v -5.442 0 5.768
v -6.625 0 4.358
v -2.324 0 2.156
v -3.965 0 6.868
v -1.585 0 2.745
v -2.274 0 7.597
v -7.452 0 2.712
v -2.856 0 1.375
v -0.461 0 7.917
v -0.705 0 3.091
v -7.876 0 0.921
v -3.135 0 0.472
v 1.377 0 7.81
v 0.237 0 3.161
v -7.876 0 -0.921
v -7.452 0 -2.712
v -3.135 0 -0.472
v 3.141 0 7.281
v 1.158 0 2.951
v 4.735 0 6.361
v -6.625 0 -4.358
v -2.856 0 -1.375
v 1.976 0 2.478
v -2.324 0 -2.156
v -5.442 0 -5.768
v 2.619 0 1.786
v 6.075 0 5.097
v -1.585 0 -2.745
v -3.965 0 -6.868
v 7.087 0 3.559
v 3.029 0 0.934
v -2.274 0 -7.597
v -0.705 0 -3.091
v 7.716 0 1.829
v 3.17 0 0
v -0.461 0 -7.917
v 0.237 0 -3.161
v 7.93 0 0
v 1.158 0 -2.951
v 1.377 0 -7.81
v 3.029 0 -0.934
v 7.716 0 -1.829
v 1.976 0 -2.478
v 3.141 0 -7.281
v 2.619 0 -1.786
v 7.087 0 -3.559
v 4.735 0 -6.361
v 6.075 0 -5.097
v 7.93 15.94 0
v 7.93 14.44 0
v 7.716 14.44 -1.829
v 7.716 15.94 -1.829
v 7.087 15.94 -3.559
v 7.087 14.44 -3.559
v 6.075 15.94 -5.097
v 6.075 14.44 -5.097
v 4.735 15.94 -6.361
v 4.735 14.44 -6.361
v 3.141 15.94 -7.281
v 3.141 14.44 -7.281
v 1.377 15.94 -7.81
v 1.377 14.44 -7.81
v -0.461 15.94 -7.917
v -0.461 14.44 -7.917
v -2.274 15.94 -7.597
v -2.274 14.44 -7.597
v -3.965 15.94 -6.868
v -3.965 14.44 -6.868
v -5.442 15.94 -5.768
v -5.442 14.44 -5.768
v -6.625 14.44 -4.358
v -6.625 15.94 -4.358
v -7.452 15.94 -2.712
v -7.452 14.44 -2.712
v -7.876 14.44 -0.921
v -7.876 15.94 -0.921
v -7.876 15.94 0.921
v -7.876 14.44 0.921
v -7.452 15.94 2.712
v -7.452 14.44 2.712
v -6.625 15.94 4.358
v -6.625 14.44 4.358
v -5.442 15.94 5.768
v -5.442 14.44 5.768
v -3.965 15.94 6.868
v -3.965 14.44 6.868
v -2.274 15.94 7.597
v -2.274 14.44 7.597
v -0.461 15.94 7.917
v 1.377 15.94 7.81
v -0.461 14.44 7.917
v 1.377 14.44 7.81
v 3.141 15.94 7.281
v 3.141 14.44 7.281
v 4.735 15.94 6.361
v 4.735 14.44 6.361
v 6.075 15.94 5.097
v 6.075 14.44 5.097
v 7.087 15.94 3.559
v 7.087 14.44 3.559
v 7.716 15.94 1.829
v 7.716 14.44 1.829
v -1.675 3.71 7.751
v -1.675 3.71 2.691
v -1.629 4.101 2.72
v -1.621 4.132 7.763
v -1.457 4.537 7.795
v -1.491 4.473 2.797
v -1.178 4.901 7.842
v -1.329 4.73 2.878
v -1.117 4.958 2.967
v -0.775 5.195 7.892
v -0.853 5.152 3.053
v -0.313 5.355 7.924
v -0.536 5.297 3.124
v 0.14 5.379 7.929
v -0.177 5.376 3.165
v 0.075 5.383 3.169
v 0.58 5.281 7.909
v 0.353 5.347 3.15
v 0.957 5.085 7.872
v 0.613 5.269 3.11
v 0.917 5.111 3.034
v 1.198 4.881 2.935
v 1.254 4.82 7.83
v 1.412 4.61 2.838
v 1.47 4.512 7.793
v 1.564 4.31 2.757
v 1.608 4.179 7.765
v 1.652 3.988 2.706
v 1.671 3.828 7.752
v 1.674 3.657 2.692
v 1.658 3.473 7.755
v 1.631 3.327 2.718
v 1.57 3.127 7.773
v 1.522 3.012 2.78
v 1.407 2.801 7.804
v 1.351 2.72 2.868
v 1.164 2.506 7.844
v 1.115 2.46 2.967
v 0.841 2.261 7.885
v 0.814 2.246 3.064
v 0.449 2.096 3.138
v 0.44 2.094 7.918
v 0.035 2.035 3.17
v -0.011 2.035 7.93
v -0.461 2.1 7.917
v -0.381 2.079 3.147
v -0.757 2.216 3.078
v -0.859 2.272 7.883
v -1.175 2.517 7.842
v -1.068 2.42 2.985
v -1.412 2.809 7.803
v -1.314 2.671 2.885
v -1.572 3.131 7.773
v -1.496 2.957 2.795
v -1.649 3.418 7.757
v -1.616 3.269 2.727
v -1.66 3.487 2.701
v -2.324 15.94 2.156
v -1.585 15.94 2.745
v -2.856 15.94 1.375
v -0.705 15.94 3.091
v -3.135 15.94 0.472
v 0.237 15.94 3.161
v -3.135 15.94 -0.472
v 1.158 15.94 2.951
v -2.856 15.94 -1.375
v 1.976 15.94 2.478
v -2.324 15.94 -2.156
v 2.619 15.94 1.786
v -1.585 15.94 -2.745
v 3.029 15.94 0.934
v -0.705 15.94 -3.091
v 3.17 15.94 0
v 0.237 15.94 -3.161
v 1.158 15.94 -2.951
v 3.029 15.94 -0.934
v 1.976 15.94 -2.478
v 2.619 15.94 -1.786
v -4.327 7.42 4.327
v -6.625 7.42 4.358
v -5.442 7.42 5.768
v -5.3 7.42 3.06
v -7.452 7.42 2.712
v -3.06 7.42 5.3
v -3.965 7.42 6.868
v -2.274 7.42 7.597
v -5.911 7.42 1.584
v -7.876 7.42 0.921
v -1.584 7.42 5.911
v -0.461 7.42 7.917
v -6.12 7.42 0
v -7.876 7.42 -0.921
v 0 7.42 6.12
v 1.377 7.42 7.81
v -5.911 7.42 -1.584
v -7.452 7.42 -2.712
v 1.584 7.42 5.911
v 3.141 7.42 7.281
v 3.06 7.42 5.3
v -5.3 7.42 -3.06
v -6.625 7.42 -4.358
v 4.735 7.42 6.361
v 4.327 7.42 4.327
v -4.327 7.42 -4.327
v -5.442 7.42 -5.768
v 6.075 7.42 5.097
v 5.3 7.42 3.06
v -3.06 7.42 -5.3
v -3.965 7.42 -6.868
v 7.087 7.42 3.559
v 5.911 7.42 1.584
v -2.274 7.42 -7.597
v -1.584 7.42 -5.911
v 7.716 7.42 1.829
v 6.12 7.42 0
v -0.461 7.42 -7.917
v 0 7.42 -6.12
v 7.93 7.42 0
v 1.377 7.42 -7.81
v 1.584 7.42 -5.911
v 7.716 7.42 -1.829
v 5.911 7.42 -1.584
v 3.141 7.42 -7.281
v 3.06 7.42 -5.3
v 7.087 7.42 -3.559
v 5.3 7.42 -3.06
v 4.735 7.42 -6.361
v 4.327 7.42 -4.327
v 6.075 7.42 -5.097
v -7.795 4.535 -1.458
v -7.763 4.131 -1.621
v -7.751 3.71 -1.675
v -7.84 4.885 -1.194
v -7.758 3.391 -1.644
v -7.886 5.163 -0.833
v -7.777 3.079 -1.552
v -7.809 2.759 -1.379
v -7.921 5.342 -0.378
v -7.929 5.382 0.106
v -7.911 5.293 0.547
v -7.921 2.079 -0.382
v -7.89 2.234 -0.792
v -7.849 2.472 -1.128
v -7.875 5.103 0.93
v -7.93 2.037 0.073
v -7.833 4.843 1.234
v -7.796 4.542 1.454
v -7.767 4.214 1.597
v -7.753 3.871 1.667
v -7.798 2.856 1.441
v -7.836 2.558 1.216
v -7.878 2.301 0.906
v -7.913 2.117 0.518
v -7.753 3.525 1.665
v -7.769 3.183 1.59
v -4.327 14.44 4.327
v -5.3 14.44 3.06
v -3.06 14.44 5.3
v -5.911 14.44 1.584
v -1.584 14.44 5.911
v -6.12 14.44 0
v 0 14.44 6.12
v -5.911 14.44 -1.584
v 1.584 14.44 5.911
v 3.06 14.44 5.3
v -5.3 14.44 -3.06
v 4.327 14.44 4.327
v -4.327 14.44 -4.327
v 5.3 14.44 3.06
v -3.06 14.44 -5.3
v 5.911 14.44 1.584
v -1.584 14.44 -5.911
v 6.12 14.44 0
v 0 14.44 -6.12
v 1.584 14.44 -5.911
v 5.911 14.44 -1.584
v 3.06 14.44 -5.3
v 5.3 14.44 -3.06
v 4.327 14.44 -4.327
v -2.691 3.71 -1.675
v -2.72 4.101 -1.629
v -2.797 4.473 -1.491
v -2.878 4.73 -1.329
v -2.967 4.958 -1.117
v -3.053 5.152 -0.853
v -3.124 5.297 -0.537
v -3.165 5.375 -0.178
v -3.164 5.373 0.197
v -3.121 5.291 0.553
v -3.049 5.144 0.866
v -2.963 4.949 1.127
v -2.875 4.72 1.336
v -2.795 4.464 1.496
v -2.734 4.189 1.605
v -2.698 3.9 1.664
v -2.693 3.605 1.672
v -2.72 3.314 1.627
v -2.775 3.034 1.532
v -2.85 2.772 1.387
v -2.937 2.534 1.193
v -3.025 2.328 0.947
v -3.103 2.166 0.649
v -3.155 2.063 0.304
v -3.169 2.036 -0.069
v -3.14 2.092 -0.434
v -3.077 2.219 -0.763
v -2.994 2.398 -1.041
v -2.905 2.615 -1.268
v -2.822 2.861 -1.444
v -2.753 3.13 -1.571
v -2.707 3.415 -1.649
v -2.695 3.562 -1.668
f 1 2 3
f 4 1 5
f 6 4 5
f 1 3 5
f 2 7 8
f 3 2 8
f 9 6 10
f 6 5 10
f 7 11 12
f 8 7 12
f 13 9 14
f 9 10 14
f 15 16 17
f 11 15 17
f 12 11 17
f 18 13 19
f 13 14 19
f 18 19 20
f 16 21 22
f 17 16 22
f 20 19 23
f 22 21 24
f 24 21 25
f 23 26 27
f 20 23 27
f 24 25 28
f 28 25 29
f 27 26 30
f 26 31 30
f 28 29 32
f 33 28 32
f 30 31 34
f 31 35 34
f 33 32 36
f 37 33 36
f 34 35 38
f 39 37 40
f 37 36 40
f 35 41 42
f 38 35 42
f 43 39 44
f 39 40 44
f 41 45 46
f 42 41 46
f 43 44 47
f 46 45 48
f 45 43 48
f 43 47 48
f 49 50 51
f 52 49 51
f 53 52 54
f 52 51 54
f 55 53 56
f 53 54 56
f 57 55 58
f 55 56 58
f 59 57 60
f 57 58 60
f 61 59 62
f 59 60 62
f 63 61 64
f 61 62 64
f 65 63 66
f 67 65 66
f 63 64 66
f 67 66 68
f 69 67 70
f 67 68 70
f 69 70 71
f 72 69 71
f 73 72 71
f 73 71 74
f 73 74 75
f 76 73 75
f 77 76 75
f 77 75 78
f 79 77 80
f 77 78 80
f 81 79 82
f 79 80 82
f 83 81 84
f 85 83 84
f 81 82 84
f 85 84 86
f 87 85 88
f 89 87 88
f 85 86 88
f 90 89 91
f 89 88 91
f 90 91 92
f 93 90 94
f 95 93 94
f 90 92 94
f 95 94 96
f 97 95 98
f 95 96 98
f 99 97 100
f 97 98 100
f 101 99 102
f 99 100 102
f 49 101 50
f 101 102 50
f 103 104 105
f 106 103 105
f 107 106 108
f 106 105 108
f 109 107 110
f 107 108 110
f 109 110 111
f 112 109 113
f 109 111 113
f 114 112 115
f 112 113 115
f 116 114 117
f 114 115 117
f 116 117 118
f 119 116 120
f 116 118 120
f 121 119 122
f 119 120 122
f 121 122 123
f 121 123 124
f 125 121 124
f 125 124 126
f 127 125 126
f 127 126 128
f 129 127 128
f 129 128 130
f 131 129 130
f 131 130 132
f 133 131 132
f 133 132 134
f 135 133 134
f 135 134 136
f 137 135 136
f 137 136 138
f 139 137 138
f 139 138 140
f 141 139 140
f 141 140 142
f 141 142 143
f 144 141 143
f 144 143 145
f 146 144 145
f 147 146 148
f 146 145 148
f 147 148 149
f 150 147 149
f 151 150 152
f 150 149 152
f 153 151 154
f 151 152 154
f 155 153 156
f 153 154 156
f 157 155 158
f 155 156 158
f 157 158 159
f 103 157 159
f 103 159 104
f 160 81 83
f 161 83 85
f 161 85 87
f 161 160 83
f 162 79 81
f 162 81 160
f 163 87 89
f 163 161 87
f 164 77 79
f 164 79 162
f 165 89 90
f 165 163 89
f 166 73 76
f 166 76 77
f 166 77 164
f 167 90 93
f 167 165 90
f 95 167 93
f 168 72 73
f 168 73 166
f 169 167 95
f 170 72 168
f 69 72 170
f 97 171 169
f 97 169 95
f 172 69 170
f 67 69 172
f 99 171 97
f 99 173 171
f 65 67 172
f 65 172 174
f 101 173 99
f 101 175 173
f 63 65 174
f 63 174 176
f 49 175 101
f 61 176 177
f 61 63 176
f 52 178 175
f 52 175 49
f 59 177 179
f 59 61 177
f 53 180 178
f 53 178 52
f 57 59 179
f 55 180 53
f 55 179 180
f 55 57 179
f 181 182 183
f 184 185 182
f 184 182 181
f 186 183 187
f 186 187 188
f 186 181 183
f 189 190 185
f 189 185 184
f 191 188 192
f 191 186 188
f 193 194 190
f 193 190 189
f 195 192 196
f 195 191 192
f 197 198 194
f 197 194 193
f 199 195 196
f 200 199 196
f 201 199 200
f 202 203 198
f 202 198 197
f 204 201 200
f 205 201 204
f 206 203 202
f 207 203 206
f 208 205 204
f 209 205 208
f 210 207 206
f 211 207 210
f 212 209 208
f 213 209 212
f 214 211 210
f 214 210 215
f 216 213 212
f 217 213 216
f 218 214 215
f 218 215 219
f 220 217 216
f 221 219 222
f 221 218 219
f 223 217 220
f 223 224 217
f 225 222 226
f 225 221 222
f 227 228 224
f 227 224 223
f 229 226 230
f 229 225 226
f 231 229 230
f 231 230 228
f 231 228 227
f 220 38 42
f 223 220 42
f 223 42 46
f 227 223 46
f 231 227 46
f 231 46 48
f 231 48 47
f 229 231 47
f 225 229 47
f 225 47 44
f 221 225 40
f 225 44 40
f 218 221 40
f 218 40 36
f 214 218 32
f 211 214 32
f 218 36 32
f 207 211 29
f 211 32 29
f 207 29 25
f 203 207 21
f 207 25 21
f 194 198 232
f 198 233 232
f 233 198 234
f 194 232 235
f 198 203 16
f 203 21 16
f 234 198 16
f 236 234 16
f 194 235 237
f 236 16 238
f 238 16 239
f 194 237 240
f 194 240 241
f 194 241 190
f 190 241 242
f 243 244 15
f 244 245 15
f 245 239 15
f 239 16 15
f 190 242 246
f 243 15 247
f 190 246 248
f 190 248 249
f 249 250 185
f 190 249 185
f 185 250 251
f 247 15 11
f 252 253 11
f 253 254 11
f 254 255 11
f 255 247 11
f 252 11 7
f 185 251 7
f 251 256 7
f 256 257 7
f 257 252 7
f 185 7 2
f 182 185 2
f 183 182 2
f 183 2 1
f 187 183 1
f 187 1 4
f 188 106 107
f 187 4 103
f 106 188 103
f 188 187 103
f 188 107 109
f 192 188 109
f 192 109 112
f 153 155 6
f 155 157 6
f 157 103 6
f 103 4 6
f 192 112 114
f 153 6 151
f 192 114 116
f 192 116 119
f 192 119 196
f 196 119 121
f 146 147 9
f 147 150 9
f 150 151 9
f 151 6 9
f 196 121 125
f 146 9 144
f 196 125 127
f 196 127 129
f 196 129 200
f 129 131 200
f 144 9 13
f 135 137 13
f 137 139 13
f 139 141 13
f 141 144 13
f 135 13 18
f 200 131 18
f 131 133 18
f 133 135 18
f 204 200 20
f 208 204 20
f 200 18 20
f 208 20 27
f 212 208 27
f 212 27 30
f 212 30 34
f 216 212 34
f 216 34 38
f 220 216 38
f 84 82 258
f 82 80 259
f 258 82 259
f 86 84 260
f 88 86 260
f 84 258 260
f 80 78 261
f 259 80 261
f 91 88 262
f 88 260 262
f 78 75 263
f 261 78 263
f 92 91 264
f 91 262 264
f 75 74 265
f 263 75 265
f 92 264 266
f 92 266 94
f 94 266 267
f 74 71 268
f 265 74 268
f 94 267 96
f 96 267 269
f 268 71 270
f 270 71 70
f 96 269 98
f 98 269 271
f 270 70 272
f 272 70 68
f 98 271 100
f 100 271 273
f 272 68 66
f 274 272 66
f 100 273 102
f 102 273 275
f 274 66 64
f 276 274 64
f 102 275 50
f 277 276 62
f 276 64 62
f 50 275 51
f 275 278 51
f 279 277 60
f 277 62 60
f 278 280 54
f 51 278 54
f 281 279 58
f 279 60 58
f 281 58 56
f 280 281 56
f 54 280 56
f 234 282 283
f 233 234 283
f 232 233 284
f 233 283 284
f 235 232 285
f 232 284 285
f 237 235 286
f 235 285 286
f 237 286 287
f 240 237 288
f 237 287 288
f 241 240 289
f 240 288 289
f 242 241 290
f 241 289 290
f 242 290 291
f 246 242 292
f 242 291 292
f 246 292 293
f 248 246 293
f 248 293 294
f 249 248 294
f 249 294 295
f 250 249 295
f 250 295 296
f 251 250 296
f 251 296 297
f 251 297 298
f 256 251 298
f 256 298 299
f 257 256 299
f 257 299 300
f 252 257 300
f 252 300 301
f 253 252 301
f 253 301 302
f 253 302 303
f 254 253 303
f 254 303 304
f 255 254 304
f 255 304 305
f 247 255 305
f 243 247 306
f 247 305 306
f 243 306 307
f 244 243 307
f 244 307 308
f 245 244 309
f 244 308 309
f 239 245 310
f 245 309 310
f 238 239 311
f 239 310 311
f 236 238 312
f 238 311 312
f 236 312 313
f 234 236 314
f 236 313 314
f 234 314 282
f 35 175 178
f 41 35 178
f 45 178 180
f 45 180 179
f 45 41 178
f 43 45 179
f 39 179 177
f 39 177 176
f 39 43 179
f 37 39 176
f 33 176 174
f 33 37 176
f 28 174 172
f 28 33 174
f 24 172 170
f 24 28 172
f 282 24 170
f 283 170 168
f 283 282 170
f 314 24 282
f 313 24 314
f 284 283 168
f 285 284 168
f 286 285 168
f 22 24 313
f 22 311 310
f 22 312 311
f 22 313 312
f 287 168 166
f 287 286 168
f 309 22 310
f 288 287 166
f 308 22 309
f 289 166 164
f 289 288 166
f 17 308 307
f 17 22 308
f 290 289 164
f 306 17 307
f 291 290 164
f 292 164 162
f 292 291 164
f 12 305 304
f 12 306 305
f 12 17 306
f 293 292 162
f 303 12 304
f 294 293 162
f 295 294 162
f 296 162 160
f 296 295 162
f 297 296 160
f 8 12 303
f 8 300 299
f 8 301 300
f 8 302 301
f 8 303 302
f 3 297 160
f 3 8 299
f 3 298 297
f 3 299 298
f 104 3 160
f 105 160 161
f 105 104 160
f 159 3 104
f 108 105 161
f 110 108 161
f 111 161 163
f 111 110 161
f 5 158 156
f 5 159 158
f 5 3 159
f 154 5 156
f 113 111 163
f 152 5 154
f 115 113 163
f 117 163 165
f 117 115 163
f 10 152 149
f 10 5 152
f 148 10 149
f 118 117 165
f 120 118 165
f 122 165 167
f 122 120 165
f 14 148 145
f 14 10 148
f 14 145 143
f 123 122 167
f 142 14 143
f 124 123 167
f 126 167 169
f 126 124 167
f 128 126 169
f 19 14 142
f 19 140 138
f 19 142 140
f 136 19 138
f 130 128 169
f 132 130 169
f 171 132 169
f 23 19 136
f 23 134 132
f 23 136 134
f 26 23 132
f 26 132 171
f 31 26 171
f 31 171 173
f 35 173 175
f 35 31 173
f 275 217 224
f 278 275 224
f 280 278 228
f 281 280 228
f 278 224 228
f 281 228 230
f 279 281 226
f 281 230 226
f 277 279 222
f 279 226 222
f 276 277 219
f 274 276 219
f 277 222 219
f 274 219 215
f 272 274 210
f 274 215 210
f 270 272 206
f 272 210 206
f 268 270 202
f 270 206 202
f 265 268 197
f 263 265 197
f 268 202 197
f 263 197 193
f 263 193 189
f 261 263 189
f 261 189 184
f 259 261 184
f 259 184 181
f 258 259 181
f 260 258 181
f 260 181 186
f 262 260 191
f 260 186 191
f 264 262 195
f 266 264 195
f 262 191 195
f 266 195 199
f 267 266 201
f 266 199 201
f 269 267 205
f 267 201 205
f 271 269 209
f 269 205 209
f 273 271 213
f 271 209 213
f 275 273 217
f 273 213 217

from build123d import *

# Parameters (mm, degrees)
SKETCH1_R           = 7.93
SKETCH1_R_2         = 3.17
BOSS_EXTRUDE1_DEPTH = 7.42
SKETCH2_R           = 6.12
SKETCH2_R_2         = 3.17
BOSS_EXTRUDE2_DEPTH = 7.02
SKETCH3_R           = 7.93
SKETCH3_R_2         = 3.17
BOSS_EXTRUDE3_DEPTH = 1.5
SKETCH4_R           = 1.675
CUT_EXTRUDE1_DEPTH  = 8.93
CIRPATTERN1_COUNT   = 2
CIRPATTERN1_ANGLE   = 90


with BuildPart() as part:
    # Sketch1 → Boss-Extrude1 (new body)
    with BuildSketch(Plane(origin=(0, 0, 0), x_dir=(1, 0, 0), z_dir=(0, 1, 0))):
        Circle(SKETCH1_R)
        Circle(SKETCH1_R_2, mode=Mode.SUBTRACT)
    extrude(amount=BOSS_EXTRUDE1_DEPTH)

    # Sketch2 → Boss-Extrude2 (add)
    with BuildSketch(Plane(origin=(0, 7.42, 0), x_dir=(1, 0, 0), z_dir=(0, 1, 0))):
        Circle(SKETCH2_R)
        Circle(SKETCH2_R_2, mode=Mode.SUBTRACT)
    extrude(amount=BOSS_EXTRUDE2_DEPTH)

    # Sketch3 → Boss-Extrude3 (add)
    with BuildSketch(Plane(origin=(0, 14.44, 0), x_dir=(1, 0, 0), z_dir=(0, 1, 0))):
        Circle(SKETCH3_R)
        Circle(SKETCH3_R_2, mode=Mode.SUBTRACT)
    extrude(amount=BOSS_EXTRUDE3_DEPTH)

    # Sketch4 → Cut-Extrude1 (cut, through all)
    with BuildSketch(Plane(origin=(0, 0, 0), x_dir=(0, 0, -1), z_dir=(1, 0, 0))):
        with Locations((0, 3.71)):
            Circle(SKETCH4_R)
    cut_extrude1 = extrude(amount=-CUT_EXTRUDE1_DEPTH, mode=Mode.SUBTRACT)

    # CirPattern1: Cut-Extrude1 ×2 about axis
    cirpattern1_axis = Axis((0, 7.42, 0), (0, 1, 0))
    for i in range(1, CIRPATTERN1_COUNT):
        add(cut_extrude1.rotate(cirpattern1_axis, i * CIRPATTERN1_ANGLE / (CIRPATTERN1_COUNT - 1)), mode=Mode.SUBTRACT)


solid = part.part
